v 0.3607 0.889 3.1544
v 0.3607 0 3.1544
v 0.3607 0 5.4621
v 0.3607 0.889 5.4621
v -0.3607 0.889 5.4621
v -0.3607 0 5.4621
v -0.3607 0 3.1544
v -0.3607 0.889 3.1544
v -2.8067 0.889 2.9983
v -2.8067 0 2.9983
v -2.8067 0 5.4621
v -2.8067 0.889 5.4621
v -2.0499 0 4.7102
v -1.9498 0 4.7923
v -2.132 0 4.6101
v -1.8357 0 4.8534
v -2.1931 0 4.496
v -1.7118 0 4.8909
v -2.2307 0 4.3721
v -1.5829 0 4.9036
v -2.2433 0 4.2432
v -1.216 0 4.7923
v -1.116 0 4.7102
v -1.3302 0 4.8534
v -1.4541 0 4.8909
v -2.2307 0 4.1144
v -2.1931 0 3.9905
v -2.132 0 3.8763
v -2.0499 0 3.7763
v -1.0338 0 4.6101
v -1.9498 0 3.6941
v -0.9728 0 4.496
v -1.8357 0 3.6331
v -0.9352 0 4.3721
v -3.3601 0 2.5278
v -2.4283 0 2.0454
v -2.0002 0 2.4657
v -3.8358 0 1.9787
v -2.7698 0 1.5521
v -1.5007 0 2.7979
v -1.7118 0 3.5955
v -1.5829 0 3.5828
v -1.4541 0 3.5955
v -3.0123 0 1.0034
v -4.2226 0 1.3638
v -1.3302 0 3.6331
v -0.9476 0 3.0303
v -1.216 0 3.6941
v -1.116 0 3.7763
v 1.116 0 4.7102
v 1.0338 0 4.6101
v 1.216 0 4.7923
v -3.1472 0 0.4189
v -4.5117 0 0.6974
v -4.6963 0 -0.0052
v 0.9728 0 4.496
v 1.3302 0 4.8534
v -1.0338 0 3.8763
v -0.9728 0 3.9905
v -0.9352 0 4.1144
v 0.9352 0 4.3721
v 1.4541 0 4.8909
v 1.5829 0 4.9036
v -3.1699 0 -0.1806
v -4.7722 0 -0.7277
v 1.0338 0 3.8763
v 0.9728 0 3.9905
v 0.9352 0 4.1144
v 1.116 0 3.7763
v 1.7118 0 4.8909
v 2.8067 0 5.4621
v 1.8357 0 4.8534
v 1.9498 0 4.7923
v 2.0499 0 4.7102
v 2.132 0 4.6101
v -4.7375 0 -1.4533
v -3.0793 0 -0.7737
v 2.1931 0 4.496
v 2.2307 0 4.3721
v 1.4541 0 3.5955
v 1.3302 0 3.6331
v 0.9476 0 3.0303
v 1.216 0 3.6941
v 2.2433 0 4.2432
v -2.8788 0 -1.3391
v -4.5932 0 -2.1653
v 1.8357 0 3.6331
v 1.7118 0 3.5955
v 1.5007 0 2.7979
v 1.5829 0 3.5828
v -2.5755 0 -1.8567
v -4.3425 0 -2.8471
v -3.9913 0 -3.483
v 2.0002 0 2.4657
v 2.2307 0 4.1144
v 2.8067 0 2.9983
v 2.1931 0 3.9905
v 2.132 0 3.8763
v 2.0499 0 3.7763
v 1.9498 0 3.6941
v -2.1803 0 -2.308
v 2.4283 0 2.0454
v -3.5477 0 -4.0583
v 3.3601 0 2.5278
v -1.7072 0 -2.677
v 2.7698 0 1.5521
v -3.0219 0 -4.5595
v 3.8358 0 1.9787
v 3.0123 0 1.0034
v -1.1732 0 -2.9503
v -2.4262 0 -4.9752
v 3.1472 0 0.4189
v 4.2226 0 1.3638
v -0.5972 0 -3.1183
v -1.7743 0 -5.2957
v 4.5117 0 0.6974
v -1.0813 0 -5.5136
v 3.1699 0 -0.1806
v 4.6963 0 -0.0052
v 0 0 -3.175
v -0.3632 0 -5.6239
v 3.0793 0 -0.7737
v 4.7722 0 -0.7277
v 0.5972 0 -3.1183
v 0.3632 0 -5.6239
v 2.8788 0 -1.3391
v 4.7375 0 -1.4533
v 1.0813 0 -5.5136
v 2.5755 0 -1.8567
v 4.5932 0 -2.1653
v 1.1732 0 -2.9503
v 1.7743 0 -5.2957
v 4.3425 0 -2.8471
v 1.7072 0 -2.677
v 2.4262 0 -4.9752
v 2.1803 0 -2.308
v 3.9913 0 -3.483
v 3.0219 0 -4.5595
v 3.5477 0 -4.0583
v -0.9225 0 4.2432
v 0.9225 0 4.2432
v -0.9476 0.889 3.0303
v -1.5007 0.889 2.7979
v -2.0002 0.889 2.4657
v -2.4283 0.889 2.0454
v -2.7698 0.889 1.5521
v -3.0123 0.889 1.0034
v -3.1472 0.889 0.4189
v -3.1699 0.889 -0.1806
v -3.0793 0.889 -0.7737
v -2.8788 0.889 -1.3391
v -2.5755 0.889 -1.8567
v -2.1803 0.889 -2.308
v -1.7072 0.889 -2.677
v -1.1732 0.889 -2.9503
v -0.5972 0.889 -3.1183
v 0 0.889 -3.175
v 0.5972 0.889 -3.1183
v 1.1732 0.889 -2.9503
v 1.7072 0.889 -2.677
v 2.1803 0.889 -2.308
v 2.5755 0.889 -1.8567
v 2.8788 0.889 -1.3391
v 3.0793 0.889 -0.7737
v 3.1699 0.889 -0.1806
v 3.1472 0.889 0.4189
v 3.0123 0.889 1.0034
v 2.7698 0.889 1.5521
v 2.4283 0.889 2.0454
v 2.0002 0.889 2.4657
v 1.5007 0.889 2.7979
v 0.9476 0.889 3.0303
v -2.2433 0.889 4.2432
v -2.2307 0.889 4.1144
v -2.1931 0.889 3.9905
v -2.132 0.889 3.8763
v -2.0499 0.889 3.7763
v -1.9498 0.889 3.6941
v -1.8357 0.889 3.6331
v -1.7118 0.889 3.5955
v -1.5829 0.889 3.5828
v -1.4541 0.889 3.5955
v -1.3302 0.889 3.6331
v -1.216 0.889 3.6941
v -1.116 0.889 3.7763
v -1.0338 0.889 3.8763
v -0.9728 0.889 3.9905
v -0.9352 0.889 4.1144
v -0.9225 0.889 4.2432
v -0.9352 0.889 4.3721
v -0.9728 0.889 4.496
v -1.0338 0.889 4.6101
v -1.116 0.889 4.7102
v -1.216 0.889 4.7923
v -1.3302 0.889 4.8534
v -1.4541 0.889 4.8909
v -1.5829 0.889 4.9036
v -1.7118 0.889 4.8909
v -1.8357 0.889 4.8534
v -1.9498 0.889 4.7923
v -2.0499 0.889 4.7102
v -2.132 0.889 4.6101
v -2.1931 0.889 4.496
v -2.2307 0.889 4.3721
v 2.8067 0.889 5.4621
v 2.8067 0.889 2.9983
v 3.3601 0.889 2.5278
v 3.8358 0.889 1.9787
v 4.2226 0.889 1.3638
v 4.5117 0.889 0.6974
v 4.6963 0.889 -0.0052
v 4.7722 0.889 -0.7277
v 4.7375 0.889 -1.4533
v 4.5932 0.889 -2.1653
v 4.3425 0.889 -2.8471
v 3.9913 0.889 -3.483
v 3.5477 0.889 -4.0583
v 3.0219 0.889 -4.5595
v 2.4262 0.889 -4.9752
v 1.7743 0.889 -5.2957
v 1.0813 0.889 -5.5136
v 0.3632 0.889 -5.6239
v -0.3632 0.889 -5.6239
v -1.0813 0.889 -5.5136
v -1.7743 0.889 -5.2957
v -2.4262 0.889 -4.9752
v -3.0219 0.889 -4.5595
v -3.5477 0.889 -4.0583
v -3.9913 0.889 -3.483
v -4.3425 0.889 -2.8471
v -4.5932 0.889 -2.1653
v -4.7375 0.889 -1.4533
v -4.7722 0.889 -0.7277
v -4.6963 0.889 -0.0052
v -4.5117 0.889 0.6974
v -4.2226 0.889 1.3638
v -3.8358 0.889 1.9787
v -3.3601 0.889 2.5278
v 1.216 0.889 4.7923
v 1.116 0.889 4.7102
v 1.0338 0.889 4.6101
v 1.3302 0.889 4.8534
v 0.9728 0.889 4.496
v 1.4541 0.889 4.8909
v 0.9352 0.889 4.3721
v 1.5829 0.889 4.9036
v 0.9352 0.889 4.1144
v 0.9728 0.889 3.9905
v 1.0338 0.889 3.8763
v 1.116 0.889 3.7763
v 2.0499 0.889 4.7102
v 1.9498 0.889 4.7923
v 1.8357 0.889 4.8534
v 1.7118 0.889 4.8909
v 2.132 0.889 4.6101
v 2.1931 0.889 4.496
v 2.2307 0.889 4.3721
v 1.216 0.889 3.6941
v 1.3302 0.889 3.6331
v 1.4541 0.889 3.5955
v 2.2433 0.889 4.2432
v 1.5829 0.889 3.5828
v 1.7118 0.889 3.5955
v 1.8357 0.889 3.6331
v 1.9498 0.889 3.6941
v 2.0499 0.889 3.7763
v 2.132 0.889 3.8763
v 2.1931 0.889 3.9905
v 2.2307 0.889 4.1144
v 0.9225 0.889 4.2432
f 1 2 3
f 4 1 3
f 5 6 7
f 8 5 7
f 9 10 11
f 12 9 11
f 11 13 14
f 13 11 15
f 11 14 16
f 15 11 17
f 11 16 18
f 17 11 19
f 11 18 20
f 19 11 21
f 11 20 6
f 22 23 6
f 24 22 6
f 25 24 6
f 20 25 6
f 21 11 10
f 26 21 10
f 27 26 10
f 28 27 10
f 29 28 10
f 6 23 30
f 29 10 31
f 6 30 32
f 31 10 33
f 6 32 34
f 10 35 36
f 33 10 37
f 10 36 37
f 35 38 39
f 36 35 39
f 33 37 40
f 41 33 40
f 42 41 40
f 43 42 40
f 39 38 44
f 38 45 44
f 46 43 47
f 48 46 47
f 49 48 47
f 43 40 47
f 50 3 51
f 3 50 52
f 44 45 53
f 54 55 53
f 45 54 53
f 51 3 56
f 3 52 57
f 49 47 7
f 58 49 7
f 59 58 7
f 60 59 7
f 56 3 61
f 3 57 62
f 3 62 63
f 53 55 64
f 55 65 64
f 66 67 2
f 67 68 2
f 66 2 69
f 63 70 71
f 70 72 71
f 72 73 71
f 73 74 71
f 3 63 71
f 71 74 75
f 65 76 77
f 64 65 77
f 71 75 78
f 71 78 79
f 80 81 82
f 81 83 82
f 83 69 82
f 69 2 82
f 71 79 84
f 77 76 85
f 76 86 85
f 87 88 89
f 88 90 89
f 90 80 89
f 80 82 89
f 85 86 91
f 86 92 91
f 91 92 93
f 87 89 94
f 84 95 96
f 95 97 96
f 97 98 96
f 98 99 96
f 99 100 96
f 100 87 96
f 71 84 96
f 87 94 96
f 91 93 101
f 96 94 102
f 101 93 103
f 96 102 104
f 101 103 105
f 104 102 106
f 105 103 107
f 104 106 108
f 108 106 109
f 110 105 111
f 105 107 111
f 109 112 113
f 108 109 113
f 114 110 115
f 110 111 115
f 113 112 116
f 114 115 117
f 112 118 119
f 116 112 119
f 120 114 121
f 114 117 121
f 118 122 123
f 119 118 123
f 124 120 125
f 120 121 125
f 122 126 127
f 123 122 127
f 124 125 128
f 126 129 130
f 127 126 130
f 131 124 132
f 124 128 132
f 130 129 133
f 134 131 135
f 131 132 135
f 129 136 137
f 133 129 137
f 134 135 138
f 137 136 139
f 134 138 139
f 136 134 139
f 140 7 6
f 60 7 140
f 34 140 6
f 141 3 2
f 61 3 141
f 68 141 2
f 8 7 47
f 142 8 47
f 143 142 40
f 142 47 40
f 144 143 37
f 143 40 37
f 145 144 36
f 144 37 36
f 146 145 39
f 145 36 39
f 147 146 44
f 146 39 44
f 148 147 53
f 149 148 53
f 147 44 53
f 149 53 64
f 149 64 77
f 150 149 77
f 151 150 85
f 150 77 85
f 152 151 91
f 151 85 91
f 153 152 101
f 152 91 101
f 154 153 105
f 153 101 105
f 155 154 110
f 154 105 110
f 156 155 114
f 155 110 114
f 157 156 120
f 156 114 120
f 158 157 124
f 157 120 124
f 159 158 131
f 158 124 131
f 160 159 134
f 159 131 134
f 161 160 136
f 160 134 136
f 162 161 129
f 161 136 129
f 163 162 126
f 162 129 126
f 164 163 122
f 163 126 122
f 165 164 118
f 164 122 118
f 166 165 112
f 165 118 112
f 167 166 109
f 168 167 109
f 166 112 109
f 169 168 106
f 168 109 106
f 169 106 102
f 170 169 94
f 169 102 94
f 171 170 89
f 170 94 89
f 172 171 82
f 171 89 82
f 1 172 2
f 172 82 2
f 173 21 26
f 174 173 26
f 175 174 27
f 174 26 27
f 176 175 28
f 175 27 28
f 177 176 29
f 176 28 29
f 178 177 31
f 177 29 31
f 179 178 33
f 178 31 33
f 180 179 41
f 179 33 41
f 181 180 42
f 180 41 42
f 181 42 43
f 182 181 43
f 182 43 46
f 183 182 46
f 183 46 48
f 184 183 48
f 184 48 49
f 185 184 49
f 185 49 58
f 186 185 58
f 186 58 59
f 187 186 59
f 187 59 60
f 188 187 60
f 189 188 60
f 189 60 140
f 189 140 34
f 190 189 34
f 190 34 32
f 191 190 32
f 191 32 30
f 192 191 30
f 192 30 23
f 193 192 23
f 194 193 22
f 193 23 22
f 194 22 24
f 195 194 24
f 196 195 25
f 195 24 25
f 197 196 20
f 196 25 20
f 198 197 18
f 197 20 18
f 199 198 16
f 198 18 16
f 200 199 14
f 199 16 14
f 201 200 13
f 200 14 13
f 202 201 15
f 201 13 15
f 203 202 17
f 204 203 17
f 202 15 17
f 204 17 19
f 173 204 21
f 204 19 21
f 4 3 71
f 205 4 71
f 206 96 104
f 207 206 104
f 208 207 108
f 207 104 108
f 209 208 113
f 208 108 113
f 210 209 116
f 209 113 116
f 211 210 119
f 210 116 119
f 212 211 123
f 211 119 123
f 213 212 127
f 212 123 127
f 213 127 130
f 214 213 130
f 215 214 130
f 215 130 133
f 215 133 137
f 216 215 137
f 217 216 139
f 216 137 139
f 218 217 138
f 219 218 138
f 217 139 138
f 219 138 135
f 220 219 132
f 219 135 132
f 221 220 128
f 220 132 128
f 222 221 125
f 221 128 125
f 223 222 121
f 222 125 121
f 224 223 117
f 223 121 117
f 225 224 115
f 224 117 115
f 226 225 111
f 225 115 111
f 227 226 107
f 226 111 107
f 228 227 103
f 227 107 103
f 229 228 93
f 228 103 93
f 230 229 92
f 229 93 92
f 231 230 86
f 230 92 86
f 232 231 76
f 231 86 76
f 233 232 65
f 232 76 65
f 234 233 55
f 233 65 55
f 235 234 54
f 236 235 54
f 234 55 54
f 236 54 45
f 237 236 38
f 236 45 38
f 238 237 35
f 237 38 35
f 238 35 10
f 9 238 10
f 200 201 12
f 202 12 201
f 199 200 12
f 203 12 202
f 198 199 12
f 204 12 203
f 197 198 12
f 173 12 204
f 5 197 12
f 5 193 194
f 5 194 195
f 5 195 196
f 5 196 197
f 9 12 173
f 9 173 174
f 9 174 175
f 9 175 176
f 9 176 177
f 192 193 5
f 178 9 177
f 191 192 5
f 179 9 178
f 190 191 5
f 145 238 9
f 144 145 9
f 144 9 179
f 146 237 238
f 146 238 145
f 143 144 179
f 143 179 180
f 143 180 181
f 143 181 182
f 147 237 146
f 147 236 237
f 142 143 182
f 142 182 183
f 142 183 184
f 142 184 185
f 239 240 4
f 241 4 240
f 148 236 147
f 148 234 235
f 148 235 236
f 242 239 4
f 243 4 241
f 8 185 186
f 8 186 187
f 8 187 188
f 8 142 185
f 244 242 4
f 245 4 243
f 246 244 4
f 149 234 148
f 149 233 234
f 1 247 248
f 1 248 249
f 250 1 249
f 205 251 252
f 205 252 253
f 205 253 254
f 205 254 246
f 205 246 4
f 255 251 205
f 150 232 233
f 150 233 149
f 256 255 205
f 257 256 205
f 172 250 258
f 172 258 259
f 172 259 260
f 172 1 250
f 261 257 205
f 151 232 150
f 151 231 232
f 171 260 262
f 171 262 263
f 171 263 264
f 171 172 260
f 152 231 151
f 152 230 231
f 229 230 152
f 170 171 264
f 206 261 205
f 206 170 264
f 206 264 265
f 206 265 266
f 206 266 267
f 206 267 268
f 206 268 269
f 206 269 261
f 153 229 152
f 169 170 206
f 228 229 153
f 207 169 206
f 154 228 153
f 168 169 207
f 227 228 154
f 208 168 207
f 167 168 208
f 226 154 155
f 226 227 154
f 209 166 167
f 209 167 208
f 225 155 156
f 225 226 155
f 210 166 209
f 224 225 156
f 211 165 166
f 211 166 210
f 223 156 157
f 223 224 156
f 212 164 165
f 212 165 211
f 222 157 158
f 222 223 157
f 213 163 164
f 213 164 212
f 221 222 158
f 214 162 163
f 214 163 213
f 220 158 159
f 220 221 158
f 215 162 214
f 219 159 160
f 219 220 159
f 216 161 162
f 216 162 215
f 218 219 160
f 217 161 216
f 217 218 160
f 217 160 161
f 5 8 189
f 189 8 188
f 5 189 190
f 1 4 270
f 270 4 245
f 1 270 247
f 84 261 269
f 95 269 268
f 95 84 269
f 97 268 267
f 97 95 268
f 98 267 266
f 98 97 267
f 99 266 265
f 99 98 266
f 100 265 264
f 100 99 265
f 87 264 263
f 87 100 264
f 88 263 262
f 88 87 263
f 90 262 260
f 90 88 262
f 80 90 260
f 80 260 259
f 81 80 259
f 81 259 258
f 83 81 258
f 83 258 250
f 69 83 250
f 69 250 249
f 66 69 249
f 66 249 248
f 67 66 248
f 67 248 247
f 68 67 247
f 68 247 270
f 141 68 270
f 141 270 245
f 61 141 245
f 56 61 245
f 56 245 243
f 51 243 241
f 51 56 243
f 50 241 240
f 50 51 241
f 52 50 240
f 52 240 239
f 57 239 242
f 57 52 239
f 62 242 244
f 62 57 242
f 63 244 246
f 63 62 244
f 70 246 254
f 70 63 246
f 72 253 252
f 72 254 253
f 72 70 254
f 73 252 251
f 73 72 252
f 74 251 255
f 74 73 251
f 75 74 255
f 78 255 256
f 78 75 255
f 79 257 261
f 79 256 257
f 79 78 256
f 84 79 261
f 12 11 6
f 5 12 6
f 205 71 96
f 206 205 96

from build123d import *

# Parameters (mm, degrees)
EXTRUDE1_DEPTH     = 0.889
SKETCH5_R          = 0.6604
CUT_EXTRUDE1_DEPTH = 1.889


with BuildPart() as part:
    # Sketch4 → Extrude1 (new body)
    with BuildSketch(Plane(origin=(0, 0, 0), x_dir=(1, 0, 0), z_dir=(0, 1, 0))):
        with BuildLine():
            Line((-2.8067, -5.46211125), (-0.36068, -5.46211125))
            Line((-0.36068, -5.46211125), (-0.36068, -3.154446851))
            ThreePointArc((-0.36068, -3.154446851), (0, 3.175), (0.36068, -3.154446851))
            Line((0.36068, -3.154446851), (0.36068, -5.46211125))
            Line((0.36068, -5.46211125), (2.8067, -5.46211125))
            Line((2.8067, -5.46211125), (2.8067, -2.99831125))
            ThreePointArc((2.8067, -2.99831125), (0, 5.63768875), (-2.8067, -2.99831125))
            Line((-2.8067, -2.99831125), (-2.8067, -5.46211125))
        make_face()
    extrude(amount=EXTRUDE1_DEPTH)

    # Sketch5 → Cut-Extrude1 (cut, through all)
    with BuildSketch(Plane(origin=(0, 0, 0), x_dir=(1, 0, 0), z_dir=(0, 1, 0))):
        with Locations((1.582947052, -4.24322866)):
            Circle(SKETCH5_R)
    cut_extrude1 = extrude(amount=CUT_EXTRUDE1_DEPTH, mode=Mode.SUBTRACT)

    # Mirror1: Cut-Extrude1 across plane
    add(cut_extrude1.mirror(Plane(origin=(0, 0, 0), x_dir=(0, 0, 1), z_dir=(1, 0, 0))), mode=Mode.SUBTRACT)


solid = part.part
